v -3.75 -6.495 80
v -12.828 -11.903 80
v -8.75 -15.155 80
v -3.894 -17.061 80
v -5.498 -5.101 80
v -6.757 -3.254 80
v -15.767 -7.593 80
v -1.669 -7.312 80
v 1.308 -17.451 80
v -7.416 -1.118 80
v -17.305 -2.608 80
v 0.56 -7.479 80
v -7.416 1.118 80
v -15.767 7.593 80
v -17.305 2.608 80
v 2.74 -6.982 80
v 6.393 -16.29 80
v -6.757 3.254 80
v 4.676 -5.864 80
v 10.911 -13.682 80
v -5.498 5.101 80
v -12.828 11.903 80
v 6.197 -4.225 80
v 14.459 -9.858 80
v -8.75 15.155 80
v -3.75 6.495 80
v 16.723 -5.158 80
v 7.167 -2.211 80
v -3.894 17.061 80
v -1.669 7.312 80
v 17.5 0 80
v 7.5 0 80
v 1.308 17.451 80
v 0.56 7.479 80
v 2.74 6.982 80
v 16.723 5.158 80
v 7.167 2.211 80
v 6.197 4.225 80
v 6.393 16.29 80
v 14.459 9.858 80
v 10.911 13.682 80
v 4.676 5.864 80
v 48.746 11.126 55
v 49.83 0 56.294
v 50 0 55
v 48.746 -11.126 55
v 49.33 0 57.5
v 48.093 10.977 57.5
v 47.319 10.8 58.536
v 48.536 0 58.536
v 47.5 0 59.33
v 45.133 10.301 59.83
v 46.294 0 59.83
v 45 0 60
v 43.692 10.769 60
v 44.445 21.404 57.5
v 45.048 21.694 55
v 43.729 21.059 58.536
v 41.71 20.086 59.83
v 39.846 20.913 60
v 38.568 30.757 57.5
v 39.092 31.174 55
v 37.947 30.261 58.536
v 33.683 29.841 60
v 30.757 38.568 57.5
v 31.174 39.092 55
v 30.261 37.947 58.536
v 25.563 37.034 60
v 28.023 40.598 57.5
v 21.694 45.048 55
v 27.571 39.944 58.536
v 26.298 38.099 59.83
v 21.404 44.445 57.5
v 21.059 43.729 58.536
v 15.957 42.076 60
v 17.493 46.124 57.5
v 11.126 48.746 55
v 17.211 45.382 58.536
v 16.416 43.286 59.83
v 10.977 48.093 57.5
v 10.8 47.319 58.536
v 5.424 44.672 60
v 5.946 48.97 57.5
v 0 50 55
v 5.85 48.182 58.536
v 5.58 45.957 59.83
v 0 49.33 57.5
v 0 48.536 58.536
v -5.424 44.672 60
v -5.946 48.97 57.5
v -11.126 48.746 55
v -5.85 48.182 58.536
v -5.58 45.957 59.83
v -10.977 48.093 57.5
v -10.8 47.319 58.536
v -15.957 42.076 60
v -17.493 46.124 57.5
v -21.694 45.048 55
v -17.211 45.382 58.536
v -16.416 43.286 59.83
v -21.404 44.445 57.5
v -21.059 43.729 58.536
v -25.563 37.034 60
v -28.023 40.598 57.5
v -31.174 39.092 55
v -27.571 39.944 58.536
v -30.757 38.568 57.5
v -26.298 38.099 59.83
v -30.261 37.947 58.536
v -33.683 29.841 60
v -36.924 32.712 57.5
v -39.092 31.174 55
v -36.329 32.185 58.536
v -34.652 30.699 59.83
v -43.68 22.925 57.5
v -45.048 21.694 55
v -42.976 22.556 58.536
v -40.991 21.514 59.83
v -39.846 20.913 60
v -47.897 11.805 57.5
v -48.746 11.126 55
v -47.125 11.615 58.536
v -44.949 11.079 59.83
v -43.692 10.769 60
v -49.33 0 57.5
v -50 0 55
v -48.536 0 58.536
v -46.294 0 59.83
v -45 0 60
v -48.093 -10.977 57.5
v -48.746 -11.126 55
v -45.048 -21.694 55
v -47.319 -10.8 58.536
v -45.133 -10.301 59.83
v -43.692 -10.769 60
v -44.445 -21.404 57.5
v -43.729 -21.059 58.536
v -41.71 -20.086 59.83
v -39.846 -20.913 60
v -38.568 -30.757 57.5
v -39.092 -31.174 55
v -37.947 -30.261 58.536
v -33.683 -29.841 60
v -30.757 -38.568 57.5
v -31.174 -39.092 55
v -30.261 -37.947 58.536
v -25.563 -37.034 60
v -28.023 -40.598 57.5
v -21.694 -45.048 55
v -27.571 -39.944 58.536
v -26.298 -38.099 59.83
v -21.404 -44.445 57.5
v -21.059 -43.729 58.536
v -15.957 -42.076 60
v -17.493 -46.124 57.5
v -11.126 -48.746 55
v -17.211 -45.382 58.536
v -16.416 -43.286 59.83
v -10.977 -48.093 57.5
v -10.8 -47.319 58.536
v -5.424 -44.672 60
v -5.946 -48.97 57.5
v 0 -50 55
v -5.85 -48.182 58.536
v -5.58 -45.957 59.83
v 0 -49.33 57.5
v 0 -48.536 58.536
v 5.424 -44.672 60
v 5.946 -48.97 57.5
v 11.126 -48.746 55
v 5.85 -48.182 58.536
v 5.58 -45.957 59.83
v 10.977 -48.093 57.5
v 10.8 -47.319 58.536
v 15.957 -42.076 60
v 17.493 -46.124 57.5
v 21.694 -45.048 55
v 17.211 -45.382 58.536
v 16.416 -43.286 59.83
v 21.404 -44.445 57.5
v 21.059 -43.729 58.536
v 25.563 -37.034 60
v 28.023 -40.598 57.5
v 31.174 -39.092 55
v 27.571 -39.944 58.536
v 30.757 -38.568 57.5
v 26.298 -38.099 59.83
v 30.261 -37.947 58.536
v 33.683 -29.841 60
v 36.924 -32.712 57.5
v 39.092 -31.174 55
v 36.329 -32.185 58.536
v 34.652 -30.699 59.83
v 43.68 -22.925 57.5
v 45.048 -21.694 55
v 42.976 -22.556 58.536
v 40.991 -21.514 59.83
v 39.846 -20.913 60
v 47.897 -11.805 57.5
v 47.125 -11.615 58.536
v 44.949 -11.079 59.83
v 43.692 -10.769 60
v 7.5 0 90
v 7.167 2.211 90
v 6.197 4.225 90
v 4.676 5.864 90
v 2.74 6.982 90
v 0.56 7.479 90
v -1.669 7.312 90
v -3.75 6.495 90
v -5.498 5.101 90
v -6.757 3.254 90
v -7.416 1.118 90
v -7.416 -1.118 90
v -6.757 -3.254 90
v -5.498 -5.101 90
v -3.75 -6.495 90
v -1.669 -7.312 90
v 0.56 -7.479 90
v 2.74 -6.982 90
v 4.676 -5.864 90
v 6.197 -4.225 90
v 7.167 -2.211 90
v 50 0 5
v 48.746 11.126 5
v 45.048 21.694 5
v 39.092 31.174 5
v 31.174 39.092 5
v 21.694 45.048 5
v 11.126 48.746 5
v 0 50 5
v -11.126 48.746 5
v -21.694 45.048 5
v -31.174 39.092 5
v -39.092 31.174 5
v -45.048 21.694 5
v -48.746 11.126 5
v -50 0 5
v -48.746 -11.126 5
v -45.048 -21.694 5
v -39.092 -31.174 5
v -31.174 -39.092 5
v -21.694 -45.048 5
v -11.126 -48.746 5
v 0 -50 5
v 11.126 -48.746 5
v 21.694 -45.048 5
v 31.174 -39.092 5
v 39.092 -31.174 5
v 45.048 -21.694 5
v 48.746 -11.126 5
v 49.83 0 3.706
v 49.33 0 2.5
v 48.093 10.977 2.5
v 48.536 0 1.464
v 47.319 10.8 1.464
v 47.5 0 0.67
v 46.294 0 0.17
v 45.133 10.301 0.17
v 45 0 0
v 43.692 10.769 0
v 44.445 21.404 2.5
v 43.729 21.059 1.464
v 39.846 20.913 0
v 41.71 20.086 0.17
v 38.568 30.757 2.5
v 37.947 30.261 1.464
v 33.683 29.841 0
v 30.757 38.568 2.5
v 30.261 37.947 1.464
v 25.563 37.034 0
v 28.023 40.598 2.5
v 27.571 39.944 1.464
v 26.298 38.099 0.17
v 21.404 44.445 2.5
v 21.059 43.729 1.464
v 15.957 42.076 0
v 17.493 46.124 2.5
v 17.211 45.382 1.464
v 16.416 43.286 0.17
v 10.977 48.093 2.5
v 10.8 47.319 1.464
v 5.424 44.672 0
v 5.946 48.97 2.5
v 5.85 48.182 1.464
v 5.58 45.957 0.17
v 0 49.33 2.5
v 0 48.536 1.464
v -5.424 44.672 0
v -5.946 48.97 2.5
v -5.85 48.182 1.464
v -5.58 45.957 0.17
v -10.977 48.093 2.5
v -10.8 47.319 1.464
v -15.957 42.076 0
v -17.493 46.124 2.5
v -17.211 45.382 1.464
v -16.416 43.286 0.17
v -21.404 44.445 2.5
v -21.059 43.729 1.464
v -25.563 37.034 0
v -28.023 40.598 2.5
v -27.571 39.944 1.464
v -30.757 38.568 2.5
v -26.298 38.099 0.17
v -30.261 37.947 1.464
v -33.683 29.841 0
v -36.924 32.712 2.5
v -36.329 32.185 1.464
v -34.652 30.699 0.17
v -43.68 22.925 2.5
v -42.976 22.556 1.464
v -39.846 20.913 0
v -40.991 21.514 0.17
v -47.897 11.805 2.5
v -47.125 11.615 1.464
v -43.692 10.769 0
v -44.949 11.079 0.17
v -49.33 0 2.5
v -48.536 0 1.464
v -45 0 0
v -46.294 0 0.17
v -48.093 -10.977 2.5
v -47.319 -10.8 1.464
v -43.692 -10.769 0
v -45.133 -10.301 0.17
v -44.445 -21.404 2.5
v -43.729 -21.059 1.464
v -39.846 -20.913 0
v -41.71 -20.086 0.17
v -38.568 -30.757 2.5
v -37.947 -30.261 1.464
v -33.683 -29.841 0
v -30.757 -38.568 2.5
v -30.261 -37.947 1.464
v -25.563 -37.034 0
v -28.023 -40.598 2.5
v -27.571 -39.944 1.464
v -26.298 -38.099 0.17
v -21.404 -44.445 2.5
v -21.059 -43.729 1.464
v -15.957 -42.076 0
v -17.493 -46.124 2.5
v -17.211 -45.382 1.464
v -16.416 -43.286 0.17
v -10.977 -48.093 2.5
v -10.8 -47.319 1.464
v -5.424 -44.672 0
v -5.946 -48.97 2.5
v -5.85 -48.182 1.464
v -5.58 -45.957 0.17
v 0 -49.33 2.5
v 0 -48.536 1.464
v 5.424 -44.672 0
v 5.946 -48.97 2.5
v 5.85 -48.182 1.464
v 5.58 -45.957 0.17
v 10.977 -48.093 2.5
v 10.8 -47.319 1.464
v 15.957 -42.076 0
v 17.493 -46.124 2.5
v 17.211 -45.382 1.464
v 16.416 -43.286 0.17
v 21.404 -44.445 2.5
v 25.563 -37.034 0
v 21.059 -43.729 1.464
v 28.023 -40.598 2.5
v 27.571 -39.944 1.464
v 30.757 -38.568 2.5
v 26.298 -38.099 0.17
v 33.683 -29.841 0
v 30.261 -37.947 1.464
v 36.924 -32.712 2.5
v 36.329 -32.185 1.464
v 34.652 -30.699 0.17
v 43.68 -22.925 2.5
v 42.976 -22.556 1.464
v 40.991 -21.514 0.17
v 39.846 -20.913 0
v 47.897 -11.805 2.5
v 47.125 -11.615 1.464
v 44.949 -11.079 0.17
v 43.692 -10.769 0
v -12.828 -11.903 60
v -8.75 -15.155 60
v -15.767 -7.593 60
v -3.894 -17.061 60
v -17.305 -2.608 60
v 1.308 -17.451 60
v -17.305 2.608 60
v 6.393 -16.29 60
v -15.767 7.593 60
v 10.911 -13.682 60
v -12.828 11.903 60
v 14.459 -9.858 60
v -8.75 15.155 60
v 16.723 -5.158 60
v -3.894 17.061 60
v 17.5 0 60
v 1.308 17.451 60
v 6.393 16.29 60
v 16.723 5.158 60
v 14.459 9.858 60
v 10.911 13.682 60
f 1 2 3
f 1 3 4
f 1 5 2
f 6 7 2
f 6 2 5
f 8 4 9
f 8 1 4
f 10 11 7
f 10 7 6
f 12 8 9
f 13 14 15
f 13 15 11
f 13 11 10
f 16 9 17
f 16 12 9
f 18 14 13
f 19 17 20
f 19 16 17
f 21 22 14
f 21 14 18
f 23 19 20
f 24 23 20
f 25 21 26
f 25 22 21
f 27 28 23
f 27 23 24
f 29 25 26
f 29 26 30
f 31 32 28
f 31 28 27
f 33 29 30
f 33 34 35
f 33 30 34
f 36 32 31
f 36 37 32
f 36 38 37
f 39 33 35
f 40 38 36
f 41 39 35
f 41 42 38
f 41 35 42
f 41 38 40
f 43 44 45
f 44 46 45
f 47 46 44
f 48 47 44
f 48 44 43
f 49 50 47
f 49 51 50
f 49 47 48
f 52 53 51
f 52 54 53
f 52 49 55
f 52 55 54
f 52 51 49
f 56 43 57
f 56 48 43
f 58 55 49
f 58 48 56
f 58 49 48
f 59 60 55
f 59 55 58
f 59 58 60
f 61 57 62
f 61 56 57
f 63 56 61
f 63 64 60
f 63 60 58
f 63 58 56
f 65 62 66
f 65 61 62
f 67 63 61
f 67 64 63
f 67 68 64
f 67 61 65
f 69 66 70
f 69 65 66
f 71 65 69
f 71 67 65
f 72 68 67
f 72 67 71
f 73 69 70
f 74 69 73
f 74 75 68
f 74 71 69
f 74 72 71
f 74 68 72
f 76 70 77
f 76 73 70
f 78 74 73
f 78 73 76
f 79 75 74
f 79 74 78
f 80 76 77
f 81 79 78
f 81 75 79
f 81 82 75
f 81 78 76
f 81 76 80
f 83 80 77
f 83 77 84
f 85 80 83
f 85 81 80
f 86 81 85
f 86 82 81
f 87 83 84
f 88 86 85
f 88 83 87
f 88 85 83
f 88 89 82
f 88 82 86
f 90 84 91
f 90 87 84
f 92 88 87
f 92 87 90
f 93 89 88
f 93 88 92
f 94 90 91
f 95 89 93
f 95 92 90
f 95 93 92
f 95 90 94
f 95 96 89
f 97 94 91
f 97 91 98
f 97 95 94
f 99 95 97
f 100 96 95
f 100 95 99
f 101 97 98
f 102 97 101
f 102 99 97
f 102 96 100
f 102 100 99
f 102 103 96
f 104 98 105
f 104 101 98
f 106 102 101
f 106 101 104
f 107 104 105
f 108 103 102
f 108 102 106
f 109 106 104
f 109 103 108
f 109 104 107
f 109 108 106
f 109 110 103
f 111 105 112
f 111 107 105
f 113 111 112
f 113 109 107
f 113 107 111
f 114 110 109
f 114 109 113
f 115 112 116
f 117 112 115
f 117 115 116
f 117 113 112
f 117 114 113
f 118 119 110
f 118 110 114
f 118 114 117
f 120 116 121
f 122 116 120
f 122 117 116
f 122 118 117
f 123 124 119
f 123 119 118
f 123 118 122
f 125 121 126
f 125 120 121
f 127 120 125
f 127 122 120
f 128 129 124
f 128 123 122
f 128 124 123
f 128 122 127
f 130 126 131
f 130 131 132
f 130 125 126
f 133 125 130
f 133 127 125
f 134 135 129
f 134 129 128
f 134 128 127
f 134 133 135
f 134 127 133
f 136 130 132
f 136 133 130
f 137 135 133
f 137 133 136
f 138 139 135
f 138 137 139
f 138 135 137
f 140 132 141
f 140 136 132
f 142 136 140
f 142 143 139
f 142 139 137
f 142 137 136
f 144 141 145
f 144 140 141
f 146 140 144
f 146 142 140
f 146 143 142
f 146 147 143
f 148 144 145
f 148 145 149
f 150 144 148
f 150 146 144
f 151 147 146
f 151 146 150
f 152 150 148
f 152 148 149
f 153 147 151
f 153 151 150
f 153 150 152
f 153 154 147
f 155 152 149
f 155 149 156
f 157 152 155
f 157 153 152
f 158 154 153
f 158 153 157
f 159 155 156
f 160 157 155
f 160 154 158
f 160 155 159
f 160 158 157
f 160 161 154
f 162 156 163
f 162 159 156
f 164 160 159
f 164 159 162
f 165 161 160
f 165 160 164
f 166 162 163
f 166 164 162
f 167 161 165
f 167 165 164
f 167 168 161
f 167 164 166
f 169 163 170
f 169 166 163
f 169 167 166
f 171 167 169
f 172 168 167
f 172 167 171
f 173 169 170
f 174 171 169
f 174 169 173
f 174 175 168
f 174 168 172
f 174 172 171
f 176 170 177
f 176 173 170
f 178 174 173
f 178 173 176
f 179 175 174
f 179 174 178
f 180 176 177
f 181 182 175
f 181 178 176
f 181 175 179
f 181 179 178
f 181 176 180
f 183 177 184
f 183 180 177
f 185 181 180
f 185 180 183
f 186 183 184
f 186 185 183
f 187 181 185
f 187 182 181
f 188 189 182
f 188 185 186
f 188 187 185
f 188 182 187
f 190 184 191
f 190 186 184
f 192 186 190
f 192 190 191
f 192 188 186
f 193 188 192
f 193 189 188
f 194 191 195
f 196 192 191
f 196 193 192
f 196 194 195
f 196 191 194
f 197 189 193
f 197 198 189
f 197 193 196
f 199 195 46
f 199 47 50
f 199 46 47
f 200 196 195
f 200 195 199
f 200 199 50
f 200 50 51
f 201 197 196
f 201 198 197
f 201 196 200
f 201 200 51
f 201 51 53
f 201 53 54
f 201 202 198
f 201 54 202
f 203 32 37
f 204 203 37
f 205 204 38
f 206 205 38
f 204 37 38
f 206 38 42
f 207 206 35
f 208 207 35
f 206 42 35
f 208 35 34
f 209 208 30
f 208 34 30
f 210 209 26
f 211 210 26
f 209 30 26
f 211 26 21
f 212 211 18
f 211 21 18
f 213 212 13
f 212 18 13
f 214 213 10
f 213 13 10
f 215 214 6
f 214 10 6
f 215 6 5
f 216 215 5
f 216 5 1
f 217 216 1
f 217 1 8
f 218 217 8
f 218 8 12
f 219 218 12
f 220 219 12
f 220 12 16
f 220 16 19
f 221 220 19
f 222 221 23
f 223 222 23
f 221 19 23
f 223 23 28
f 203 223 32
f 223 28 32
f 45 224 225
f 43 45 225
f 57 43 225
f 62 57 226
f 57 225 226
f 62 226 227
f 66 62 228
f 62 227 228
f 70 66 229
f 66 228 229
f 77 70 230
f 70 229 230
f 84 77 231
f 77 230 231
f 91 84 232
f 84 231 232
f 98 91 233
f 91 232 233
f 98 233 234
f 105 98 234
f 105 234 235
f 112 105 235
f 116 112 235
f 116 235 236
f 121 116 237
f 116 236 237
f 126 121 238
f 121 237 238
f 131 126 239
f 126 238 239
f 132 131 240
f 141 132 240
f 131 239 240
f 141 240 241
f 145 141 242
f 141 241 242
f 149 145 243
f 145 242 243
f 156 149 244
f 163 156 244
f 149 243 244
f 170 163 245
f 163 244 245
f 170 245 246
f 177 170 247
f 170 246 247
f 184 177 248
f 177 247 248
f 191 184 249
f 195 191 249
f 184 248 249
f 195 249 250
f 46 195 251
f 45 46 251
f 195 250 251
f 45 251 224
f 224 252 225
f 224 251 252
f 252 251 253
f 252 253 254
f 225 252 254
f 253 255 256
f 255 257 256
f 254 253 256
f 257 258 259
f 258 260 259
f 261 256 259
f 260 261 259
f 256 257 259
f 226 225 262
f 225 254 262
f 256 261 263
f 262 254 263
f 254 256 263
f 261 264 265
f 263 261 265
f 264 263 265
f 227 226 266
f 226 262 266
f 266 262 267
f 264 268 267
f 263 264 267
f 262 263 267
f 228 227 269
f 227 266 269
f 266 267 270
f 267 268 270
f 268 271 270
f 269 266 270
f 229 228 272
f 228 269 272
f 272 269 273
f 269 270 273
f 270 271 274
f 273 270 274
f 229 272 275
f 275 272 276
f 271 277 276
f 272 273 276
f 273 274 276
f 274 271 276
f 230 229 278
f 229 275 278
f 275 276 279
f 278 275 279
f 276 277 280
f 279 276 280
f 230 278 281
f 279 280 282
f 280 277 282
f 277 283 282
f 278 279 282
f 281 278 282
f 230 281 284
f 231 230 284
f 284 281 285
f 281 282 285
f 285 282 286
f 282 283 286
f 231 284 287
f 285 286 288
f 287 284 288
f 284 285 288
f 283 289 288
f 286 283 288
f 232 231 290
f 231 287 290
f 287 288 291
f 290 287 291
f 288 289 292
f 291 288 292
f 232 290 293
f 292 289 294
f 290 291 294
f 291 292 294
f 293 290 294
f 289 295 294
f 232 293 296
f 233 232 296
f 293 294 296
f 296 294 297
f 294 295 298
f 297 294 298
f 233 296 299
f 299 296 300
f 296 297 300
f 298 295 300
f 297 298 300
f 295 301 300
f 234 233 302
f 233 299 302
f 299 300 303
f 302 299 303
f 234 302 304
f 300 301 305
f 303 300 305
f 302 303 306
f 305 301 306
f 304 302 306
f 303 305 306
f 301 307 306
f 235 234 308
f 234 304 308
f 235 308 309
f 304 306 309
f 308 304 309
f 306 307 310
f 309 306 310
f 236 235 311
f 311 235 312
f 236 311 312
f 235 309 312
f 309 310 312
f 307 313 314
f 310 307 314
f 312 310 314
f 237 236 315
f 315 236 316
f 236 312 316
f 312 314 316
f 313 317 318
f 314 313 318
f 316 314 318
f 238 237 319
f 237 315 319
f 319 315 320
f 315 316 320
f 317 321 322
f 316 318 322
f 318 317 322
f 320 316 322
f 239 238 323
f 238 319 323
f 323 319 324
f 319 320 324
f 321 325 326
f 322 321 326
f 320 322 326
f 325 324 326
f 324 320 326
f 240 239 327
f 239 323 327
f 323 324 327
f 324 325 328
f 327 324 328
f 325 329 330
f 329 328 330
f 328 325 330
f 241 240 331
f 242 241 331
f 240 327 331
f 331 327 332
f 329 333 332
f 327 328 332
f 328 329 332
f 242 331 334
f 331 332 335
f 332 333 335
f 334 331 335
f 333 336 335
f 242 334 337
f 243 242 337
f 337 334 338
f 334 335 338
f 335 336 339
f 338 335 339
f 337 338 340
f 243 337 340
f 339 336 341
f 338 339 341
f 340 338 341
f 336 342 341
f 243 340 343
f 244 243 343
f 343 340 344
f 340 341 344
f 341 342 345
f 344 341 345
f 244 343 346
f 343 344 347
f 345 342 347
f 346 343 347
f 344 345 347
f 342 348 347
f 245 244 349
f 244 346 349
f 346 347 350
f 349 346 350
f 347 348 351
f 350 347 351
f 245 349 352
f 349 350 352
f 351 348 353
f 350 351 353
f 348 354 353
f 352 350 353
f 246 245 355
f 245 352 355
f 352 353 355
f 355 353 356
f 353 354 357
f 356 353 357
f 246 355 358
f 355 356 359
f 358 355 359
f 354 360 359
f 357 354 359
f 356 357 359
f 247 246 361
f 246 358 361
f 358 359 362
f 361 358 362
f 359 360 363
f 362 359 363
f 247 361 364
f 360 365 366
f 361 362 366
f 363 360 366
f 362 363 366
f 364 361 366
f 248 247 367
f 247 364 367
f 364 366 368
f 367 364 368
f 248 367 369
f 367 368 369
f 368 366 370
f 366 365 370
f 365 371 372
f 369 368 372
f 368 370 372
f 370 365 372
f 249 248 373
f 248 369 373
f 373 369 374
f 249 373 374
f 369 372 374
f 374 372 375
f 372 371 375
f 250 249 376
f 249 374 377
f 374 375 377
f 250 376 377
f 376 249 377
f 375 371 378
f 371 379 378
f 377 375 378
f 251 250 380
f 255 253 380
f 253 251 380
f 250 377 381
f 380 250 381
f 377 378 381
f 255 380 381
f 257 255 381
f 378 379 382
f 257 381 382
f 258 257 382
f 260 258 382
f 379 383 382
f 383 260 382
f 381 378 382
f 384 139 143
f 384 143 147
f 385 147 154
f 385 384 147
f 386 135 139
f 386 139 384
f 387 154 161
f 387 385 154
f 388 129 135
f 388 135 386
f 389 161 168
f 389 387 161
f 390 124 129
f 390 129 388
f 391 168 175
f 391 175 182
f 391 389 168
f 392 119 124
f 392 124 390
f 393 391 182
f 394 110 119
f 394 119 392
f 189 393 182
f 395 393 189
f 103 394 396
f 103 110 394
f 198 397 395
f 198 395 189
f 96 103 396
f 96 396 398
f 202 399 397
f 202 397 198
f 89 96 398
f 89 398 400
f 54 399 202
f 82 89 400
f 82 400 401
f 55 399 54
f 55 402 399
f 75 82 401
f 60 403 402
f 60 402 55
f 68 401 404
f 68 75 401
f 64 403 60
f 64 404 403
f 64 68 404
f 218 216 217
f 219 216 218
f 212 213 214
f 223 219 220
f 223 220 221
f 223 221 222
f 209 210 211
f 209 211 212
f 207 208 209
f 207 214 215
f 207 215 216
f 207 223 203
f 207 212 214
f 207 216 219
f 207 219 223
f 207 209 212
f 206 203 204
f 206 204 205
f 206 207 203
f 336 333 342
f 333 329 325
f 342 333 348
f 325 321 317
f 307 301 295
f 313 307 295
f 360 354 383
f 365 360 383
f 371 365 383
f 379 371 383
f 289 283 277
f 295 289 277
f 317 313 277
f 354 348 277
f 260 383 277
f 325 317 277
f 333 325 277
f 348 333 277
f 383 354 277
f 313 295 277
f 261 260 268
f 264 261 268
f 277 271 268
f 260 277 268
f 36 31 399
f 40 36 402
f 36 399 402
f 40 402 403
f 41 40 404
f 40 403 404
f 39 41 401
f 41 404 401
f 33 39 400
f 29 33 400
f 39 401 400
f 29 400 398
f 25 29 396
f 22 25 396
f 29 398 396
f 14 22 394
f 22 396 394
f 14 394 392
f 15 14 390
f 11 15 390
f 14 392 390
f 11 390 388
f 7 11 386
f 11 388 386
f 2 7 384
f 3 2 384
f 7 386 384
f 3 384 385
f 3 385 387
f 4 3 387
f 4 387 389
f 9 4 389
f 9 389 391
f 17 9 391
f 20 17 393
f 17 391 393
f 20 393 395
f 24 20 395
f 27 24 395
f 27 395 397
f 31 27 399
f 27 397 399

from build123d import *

# Parameters (mm, degrees)
F0_R     = 50
F1_DEPTH = 60
F2_R     = 5
F3_R     = 17.5
F4_DEPTH = 20
F5_R     = 7.5
F6_DEPTH = 10


with BuildPart() as f1:
    # F0 (on Top) → F1 (new body)
    with BuildSketch(Plane.XY):
        Circle(F0_R)
    extrude(amount=F1_DEPTH)

    # F2
    f2_edges = [f1.edges().sort_by_distance(p)[0] for p in [
        (-50, 0, 60),
        (-50, 0, 0),
    ]]
    fillet(f2_edges, radius=F2_R)

    # F3 (on face) → F4 (join)
    with BuildSketch(Plane.XY.offset(60)):
        Circle(F3_R)
    extrude(amount=F4_DEPTH)

    # F5 (on face) → F6 (join)
    with BuildSketch(Plane.XY.offset(80)):
        Circle(F5_R)
    extrude(amount=F6_DEPTH)


solid = f1.part
